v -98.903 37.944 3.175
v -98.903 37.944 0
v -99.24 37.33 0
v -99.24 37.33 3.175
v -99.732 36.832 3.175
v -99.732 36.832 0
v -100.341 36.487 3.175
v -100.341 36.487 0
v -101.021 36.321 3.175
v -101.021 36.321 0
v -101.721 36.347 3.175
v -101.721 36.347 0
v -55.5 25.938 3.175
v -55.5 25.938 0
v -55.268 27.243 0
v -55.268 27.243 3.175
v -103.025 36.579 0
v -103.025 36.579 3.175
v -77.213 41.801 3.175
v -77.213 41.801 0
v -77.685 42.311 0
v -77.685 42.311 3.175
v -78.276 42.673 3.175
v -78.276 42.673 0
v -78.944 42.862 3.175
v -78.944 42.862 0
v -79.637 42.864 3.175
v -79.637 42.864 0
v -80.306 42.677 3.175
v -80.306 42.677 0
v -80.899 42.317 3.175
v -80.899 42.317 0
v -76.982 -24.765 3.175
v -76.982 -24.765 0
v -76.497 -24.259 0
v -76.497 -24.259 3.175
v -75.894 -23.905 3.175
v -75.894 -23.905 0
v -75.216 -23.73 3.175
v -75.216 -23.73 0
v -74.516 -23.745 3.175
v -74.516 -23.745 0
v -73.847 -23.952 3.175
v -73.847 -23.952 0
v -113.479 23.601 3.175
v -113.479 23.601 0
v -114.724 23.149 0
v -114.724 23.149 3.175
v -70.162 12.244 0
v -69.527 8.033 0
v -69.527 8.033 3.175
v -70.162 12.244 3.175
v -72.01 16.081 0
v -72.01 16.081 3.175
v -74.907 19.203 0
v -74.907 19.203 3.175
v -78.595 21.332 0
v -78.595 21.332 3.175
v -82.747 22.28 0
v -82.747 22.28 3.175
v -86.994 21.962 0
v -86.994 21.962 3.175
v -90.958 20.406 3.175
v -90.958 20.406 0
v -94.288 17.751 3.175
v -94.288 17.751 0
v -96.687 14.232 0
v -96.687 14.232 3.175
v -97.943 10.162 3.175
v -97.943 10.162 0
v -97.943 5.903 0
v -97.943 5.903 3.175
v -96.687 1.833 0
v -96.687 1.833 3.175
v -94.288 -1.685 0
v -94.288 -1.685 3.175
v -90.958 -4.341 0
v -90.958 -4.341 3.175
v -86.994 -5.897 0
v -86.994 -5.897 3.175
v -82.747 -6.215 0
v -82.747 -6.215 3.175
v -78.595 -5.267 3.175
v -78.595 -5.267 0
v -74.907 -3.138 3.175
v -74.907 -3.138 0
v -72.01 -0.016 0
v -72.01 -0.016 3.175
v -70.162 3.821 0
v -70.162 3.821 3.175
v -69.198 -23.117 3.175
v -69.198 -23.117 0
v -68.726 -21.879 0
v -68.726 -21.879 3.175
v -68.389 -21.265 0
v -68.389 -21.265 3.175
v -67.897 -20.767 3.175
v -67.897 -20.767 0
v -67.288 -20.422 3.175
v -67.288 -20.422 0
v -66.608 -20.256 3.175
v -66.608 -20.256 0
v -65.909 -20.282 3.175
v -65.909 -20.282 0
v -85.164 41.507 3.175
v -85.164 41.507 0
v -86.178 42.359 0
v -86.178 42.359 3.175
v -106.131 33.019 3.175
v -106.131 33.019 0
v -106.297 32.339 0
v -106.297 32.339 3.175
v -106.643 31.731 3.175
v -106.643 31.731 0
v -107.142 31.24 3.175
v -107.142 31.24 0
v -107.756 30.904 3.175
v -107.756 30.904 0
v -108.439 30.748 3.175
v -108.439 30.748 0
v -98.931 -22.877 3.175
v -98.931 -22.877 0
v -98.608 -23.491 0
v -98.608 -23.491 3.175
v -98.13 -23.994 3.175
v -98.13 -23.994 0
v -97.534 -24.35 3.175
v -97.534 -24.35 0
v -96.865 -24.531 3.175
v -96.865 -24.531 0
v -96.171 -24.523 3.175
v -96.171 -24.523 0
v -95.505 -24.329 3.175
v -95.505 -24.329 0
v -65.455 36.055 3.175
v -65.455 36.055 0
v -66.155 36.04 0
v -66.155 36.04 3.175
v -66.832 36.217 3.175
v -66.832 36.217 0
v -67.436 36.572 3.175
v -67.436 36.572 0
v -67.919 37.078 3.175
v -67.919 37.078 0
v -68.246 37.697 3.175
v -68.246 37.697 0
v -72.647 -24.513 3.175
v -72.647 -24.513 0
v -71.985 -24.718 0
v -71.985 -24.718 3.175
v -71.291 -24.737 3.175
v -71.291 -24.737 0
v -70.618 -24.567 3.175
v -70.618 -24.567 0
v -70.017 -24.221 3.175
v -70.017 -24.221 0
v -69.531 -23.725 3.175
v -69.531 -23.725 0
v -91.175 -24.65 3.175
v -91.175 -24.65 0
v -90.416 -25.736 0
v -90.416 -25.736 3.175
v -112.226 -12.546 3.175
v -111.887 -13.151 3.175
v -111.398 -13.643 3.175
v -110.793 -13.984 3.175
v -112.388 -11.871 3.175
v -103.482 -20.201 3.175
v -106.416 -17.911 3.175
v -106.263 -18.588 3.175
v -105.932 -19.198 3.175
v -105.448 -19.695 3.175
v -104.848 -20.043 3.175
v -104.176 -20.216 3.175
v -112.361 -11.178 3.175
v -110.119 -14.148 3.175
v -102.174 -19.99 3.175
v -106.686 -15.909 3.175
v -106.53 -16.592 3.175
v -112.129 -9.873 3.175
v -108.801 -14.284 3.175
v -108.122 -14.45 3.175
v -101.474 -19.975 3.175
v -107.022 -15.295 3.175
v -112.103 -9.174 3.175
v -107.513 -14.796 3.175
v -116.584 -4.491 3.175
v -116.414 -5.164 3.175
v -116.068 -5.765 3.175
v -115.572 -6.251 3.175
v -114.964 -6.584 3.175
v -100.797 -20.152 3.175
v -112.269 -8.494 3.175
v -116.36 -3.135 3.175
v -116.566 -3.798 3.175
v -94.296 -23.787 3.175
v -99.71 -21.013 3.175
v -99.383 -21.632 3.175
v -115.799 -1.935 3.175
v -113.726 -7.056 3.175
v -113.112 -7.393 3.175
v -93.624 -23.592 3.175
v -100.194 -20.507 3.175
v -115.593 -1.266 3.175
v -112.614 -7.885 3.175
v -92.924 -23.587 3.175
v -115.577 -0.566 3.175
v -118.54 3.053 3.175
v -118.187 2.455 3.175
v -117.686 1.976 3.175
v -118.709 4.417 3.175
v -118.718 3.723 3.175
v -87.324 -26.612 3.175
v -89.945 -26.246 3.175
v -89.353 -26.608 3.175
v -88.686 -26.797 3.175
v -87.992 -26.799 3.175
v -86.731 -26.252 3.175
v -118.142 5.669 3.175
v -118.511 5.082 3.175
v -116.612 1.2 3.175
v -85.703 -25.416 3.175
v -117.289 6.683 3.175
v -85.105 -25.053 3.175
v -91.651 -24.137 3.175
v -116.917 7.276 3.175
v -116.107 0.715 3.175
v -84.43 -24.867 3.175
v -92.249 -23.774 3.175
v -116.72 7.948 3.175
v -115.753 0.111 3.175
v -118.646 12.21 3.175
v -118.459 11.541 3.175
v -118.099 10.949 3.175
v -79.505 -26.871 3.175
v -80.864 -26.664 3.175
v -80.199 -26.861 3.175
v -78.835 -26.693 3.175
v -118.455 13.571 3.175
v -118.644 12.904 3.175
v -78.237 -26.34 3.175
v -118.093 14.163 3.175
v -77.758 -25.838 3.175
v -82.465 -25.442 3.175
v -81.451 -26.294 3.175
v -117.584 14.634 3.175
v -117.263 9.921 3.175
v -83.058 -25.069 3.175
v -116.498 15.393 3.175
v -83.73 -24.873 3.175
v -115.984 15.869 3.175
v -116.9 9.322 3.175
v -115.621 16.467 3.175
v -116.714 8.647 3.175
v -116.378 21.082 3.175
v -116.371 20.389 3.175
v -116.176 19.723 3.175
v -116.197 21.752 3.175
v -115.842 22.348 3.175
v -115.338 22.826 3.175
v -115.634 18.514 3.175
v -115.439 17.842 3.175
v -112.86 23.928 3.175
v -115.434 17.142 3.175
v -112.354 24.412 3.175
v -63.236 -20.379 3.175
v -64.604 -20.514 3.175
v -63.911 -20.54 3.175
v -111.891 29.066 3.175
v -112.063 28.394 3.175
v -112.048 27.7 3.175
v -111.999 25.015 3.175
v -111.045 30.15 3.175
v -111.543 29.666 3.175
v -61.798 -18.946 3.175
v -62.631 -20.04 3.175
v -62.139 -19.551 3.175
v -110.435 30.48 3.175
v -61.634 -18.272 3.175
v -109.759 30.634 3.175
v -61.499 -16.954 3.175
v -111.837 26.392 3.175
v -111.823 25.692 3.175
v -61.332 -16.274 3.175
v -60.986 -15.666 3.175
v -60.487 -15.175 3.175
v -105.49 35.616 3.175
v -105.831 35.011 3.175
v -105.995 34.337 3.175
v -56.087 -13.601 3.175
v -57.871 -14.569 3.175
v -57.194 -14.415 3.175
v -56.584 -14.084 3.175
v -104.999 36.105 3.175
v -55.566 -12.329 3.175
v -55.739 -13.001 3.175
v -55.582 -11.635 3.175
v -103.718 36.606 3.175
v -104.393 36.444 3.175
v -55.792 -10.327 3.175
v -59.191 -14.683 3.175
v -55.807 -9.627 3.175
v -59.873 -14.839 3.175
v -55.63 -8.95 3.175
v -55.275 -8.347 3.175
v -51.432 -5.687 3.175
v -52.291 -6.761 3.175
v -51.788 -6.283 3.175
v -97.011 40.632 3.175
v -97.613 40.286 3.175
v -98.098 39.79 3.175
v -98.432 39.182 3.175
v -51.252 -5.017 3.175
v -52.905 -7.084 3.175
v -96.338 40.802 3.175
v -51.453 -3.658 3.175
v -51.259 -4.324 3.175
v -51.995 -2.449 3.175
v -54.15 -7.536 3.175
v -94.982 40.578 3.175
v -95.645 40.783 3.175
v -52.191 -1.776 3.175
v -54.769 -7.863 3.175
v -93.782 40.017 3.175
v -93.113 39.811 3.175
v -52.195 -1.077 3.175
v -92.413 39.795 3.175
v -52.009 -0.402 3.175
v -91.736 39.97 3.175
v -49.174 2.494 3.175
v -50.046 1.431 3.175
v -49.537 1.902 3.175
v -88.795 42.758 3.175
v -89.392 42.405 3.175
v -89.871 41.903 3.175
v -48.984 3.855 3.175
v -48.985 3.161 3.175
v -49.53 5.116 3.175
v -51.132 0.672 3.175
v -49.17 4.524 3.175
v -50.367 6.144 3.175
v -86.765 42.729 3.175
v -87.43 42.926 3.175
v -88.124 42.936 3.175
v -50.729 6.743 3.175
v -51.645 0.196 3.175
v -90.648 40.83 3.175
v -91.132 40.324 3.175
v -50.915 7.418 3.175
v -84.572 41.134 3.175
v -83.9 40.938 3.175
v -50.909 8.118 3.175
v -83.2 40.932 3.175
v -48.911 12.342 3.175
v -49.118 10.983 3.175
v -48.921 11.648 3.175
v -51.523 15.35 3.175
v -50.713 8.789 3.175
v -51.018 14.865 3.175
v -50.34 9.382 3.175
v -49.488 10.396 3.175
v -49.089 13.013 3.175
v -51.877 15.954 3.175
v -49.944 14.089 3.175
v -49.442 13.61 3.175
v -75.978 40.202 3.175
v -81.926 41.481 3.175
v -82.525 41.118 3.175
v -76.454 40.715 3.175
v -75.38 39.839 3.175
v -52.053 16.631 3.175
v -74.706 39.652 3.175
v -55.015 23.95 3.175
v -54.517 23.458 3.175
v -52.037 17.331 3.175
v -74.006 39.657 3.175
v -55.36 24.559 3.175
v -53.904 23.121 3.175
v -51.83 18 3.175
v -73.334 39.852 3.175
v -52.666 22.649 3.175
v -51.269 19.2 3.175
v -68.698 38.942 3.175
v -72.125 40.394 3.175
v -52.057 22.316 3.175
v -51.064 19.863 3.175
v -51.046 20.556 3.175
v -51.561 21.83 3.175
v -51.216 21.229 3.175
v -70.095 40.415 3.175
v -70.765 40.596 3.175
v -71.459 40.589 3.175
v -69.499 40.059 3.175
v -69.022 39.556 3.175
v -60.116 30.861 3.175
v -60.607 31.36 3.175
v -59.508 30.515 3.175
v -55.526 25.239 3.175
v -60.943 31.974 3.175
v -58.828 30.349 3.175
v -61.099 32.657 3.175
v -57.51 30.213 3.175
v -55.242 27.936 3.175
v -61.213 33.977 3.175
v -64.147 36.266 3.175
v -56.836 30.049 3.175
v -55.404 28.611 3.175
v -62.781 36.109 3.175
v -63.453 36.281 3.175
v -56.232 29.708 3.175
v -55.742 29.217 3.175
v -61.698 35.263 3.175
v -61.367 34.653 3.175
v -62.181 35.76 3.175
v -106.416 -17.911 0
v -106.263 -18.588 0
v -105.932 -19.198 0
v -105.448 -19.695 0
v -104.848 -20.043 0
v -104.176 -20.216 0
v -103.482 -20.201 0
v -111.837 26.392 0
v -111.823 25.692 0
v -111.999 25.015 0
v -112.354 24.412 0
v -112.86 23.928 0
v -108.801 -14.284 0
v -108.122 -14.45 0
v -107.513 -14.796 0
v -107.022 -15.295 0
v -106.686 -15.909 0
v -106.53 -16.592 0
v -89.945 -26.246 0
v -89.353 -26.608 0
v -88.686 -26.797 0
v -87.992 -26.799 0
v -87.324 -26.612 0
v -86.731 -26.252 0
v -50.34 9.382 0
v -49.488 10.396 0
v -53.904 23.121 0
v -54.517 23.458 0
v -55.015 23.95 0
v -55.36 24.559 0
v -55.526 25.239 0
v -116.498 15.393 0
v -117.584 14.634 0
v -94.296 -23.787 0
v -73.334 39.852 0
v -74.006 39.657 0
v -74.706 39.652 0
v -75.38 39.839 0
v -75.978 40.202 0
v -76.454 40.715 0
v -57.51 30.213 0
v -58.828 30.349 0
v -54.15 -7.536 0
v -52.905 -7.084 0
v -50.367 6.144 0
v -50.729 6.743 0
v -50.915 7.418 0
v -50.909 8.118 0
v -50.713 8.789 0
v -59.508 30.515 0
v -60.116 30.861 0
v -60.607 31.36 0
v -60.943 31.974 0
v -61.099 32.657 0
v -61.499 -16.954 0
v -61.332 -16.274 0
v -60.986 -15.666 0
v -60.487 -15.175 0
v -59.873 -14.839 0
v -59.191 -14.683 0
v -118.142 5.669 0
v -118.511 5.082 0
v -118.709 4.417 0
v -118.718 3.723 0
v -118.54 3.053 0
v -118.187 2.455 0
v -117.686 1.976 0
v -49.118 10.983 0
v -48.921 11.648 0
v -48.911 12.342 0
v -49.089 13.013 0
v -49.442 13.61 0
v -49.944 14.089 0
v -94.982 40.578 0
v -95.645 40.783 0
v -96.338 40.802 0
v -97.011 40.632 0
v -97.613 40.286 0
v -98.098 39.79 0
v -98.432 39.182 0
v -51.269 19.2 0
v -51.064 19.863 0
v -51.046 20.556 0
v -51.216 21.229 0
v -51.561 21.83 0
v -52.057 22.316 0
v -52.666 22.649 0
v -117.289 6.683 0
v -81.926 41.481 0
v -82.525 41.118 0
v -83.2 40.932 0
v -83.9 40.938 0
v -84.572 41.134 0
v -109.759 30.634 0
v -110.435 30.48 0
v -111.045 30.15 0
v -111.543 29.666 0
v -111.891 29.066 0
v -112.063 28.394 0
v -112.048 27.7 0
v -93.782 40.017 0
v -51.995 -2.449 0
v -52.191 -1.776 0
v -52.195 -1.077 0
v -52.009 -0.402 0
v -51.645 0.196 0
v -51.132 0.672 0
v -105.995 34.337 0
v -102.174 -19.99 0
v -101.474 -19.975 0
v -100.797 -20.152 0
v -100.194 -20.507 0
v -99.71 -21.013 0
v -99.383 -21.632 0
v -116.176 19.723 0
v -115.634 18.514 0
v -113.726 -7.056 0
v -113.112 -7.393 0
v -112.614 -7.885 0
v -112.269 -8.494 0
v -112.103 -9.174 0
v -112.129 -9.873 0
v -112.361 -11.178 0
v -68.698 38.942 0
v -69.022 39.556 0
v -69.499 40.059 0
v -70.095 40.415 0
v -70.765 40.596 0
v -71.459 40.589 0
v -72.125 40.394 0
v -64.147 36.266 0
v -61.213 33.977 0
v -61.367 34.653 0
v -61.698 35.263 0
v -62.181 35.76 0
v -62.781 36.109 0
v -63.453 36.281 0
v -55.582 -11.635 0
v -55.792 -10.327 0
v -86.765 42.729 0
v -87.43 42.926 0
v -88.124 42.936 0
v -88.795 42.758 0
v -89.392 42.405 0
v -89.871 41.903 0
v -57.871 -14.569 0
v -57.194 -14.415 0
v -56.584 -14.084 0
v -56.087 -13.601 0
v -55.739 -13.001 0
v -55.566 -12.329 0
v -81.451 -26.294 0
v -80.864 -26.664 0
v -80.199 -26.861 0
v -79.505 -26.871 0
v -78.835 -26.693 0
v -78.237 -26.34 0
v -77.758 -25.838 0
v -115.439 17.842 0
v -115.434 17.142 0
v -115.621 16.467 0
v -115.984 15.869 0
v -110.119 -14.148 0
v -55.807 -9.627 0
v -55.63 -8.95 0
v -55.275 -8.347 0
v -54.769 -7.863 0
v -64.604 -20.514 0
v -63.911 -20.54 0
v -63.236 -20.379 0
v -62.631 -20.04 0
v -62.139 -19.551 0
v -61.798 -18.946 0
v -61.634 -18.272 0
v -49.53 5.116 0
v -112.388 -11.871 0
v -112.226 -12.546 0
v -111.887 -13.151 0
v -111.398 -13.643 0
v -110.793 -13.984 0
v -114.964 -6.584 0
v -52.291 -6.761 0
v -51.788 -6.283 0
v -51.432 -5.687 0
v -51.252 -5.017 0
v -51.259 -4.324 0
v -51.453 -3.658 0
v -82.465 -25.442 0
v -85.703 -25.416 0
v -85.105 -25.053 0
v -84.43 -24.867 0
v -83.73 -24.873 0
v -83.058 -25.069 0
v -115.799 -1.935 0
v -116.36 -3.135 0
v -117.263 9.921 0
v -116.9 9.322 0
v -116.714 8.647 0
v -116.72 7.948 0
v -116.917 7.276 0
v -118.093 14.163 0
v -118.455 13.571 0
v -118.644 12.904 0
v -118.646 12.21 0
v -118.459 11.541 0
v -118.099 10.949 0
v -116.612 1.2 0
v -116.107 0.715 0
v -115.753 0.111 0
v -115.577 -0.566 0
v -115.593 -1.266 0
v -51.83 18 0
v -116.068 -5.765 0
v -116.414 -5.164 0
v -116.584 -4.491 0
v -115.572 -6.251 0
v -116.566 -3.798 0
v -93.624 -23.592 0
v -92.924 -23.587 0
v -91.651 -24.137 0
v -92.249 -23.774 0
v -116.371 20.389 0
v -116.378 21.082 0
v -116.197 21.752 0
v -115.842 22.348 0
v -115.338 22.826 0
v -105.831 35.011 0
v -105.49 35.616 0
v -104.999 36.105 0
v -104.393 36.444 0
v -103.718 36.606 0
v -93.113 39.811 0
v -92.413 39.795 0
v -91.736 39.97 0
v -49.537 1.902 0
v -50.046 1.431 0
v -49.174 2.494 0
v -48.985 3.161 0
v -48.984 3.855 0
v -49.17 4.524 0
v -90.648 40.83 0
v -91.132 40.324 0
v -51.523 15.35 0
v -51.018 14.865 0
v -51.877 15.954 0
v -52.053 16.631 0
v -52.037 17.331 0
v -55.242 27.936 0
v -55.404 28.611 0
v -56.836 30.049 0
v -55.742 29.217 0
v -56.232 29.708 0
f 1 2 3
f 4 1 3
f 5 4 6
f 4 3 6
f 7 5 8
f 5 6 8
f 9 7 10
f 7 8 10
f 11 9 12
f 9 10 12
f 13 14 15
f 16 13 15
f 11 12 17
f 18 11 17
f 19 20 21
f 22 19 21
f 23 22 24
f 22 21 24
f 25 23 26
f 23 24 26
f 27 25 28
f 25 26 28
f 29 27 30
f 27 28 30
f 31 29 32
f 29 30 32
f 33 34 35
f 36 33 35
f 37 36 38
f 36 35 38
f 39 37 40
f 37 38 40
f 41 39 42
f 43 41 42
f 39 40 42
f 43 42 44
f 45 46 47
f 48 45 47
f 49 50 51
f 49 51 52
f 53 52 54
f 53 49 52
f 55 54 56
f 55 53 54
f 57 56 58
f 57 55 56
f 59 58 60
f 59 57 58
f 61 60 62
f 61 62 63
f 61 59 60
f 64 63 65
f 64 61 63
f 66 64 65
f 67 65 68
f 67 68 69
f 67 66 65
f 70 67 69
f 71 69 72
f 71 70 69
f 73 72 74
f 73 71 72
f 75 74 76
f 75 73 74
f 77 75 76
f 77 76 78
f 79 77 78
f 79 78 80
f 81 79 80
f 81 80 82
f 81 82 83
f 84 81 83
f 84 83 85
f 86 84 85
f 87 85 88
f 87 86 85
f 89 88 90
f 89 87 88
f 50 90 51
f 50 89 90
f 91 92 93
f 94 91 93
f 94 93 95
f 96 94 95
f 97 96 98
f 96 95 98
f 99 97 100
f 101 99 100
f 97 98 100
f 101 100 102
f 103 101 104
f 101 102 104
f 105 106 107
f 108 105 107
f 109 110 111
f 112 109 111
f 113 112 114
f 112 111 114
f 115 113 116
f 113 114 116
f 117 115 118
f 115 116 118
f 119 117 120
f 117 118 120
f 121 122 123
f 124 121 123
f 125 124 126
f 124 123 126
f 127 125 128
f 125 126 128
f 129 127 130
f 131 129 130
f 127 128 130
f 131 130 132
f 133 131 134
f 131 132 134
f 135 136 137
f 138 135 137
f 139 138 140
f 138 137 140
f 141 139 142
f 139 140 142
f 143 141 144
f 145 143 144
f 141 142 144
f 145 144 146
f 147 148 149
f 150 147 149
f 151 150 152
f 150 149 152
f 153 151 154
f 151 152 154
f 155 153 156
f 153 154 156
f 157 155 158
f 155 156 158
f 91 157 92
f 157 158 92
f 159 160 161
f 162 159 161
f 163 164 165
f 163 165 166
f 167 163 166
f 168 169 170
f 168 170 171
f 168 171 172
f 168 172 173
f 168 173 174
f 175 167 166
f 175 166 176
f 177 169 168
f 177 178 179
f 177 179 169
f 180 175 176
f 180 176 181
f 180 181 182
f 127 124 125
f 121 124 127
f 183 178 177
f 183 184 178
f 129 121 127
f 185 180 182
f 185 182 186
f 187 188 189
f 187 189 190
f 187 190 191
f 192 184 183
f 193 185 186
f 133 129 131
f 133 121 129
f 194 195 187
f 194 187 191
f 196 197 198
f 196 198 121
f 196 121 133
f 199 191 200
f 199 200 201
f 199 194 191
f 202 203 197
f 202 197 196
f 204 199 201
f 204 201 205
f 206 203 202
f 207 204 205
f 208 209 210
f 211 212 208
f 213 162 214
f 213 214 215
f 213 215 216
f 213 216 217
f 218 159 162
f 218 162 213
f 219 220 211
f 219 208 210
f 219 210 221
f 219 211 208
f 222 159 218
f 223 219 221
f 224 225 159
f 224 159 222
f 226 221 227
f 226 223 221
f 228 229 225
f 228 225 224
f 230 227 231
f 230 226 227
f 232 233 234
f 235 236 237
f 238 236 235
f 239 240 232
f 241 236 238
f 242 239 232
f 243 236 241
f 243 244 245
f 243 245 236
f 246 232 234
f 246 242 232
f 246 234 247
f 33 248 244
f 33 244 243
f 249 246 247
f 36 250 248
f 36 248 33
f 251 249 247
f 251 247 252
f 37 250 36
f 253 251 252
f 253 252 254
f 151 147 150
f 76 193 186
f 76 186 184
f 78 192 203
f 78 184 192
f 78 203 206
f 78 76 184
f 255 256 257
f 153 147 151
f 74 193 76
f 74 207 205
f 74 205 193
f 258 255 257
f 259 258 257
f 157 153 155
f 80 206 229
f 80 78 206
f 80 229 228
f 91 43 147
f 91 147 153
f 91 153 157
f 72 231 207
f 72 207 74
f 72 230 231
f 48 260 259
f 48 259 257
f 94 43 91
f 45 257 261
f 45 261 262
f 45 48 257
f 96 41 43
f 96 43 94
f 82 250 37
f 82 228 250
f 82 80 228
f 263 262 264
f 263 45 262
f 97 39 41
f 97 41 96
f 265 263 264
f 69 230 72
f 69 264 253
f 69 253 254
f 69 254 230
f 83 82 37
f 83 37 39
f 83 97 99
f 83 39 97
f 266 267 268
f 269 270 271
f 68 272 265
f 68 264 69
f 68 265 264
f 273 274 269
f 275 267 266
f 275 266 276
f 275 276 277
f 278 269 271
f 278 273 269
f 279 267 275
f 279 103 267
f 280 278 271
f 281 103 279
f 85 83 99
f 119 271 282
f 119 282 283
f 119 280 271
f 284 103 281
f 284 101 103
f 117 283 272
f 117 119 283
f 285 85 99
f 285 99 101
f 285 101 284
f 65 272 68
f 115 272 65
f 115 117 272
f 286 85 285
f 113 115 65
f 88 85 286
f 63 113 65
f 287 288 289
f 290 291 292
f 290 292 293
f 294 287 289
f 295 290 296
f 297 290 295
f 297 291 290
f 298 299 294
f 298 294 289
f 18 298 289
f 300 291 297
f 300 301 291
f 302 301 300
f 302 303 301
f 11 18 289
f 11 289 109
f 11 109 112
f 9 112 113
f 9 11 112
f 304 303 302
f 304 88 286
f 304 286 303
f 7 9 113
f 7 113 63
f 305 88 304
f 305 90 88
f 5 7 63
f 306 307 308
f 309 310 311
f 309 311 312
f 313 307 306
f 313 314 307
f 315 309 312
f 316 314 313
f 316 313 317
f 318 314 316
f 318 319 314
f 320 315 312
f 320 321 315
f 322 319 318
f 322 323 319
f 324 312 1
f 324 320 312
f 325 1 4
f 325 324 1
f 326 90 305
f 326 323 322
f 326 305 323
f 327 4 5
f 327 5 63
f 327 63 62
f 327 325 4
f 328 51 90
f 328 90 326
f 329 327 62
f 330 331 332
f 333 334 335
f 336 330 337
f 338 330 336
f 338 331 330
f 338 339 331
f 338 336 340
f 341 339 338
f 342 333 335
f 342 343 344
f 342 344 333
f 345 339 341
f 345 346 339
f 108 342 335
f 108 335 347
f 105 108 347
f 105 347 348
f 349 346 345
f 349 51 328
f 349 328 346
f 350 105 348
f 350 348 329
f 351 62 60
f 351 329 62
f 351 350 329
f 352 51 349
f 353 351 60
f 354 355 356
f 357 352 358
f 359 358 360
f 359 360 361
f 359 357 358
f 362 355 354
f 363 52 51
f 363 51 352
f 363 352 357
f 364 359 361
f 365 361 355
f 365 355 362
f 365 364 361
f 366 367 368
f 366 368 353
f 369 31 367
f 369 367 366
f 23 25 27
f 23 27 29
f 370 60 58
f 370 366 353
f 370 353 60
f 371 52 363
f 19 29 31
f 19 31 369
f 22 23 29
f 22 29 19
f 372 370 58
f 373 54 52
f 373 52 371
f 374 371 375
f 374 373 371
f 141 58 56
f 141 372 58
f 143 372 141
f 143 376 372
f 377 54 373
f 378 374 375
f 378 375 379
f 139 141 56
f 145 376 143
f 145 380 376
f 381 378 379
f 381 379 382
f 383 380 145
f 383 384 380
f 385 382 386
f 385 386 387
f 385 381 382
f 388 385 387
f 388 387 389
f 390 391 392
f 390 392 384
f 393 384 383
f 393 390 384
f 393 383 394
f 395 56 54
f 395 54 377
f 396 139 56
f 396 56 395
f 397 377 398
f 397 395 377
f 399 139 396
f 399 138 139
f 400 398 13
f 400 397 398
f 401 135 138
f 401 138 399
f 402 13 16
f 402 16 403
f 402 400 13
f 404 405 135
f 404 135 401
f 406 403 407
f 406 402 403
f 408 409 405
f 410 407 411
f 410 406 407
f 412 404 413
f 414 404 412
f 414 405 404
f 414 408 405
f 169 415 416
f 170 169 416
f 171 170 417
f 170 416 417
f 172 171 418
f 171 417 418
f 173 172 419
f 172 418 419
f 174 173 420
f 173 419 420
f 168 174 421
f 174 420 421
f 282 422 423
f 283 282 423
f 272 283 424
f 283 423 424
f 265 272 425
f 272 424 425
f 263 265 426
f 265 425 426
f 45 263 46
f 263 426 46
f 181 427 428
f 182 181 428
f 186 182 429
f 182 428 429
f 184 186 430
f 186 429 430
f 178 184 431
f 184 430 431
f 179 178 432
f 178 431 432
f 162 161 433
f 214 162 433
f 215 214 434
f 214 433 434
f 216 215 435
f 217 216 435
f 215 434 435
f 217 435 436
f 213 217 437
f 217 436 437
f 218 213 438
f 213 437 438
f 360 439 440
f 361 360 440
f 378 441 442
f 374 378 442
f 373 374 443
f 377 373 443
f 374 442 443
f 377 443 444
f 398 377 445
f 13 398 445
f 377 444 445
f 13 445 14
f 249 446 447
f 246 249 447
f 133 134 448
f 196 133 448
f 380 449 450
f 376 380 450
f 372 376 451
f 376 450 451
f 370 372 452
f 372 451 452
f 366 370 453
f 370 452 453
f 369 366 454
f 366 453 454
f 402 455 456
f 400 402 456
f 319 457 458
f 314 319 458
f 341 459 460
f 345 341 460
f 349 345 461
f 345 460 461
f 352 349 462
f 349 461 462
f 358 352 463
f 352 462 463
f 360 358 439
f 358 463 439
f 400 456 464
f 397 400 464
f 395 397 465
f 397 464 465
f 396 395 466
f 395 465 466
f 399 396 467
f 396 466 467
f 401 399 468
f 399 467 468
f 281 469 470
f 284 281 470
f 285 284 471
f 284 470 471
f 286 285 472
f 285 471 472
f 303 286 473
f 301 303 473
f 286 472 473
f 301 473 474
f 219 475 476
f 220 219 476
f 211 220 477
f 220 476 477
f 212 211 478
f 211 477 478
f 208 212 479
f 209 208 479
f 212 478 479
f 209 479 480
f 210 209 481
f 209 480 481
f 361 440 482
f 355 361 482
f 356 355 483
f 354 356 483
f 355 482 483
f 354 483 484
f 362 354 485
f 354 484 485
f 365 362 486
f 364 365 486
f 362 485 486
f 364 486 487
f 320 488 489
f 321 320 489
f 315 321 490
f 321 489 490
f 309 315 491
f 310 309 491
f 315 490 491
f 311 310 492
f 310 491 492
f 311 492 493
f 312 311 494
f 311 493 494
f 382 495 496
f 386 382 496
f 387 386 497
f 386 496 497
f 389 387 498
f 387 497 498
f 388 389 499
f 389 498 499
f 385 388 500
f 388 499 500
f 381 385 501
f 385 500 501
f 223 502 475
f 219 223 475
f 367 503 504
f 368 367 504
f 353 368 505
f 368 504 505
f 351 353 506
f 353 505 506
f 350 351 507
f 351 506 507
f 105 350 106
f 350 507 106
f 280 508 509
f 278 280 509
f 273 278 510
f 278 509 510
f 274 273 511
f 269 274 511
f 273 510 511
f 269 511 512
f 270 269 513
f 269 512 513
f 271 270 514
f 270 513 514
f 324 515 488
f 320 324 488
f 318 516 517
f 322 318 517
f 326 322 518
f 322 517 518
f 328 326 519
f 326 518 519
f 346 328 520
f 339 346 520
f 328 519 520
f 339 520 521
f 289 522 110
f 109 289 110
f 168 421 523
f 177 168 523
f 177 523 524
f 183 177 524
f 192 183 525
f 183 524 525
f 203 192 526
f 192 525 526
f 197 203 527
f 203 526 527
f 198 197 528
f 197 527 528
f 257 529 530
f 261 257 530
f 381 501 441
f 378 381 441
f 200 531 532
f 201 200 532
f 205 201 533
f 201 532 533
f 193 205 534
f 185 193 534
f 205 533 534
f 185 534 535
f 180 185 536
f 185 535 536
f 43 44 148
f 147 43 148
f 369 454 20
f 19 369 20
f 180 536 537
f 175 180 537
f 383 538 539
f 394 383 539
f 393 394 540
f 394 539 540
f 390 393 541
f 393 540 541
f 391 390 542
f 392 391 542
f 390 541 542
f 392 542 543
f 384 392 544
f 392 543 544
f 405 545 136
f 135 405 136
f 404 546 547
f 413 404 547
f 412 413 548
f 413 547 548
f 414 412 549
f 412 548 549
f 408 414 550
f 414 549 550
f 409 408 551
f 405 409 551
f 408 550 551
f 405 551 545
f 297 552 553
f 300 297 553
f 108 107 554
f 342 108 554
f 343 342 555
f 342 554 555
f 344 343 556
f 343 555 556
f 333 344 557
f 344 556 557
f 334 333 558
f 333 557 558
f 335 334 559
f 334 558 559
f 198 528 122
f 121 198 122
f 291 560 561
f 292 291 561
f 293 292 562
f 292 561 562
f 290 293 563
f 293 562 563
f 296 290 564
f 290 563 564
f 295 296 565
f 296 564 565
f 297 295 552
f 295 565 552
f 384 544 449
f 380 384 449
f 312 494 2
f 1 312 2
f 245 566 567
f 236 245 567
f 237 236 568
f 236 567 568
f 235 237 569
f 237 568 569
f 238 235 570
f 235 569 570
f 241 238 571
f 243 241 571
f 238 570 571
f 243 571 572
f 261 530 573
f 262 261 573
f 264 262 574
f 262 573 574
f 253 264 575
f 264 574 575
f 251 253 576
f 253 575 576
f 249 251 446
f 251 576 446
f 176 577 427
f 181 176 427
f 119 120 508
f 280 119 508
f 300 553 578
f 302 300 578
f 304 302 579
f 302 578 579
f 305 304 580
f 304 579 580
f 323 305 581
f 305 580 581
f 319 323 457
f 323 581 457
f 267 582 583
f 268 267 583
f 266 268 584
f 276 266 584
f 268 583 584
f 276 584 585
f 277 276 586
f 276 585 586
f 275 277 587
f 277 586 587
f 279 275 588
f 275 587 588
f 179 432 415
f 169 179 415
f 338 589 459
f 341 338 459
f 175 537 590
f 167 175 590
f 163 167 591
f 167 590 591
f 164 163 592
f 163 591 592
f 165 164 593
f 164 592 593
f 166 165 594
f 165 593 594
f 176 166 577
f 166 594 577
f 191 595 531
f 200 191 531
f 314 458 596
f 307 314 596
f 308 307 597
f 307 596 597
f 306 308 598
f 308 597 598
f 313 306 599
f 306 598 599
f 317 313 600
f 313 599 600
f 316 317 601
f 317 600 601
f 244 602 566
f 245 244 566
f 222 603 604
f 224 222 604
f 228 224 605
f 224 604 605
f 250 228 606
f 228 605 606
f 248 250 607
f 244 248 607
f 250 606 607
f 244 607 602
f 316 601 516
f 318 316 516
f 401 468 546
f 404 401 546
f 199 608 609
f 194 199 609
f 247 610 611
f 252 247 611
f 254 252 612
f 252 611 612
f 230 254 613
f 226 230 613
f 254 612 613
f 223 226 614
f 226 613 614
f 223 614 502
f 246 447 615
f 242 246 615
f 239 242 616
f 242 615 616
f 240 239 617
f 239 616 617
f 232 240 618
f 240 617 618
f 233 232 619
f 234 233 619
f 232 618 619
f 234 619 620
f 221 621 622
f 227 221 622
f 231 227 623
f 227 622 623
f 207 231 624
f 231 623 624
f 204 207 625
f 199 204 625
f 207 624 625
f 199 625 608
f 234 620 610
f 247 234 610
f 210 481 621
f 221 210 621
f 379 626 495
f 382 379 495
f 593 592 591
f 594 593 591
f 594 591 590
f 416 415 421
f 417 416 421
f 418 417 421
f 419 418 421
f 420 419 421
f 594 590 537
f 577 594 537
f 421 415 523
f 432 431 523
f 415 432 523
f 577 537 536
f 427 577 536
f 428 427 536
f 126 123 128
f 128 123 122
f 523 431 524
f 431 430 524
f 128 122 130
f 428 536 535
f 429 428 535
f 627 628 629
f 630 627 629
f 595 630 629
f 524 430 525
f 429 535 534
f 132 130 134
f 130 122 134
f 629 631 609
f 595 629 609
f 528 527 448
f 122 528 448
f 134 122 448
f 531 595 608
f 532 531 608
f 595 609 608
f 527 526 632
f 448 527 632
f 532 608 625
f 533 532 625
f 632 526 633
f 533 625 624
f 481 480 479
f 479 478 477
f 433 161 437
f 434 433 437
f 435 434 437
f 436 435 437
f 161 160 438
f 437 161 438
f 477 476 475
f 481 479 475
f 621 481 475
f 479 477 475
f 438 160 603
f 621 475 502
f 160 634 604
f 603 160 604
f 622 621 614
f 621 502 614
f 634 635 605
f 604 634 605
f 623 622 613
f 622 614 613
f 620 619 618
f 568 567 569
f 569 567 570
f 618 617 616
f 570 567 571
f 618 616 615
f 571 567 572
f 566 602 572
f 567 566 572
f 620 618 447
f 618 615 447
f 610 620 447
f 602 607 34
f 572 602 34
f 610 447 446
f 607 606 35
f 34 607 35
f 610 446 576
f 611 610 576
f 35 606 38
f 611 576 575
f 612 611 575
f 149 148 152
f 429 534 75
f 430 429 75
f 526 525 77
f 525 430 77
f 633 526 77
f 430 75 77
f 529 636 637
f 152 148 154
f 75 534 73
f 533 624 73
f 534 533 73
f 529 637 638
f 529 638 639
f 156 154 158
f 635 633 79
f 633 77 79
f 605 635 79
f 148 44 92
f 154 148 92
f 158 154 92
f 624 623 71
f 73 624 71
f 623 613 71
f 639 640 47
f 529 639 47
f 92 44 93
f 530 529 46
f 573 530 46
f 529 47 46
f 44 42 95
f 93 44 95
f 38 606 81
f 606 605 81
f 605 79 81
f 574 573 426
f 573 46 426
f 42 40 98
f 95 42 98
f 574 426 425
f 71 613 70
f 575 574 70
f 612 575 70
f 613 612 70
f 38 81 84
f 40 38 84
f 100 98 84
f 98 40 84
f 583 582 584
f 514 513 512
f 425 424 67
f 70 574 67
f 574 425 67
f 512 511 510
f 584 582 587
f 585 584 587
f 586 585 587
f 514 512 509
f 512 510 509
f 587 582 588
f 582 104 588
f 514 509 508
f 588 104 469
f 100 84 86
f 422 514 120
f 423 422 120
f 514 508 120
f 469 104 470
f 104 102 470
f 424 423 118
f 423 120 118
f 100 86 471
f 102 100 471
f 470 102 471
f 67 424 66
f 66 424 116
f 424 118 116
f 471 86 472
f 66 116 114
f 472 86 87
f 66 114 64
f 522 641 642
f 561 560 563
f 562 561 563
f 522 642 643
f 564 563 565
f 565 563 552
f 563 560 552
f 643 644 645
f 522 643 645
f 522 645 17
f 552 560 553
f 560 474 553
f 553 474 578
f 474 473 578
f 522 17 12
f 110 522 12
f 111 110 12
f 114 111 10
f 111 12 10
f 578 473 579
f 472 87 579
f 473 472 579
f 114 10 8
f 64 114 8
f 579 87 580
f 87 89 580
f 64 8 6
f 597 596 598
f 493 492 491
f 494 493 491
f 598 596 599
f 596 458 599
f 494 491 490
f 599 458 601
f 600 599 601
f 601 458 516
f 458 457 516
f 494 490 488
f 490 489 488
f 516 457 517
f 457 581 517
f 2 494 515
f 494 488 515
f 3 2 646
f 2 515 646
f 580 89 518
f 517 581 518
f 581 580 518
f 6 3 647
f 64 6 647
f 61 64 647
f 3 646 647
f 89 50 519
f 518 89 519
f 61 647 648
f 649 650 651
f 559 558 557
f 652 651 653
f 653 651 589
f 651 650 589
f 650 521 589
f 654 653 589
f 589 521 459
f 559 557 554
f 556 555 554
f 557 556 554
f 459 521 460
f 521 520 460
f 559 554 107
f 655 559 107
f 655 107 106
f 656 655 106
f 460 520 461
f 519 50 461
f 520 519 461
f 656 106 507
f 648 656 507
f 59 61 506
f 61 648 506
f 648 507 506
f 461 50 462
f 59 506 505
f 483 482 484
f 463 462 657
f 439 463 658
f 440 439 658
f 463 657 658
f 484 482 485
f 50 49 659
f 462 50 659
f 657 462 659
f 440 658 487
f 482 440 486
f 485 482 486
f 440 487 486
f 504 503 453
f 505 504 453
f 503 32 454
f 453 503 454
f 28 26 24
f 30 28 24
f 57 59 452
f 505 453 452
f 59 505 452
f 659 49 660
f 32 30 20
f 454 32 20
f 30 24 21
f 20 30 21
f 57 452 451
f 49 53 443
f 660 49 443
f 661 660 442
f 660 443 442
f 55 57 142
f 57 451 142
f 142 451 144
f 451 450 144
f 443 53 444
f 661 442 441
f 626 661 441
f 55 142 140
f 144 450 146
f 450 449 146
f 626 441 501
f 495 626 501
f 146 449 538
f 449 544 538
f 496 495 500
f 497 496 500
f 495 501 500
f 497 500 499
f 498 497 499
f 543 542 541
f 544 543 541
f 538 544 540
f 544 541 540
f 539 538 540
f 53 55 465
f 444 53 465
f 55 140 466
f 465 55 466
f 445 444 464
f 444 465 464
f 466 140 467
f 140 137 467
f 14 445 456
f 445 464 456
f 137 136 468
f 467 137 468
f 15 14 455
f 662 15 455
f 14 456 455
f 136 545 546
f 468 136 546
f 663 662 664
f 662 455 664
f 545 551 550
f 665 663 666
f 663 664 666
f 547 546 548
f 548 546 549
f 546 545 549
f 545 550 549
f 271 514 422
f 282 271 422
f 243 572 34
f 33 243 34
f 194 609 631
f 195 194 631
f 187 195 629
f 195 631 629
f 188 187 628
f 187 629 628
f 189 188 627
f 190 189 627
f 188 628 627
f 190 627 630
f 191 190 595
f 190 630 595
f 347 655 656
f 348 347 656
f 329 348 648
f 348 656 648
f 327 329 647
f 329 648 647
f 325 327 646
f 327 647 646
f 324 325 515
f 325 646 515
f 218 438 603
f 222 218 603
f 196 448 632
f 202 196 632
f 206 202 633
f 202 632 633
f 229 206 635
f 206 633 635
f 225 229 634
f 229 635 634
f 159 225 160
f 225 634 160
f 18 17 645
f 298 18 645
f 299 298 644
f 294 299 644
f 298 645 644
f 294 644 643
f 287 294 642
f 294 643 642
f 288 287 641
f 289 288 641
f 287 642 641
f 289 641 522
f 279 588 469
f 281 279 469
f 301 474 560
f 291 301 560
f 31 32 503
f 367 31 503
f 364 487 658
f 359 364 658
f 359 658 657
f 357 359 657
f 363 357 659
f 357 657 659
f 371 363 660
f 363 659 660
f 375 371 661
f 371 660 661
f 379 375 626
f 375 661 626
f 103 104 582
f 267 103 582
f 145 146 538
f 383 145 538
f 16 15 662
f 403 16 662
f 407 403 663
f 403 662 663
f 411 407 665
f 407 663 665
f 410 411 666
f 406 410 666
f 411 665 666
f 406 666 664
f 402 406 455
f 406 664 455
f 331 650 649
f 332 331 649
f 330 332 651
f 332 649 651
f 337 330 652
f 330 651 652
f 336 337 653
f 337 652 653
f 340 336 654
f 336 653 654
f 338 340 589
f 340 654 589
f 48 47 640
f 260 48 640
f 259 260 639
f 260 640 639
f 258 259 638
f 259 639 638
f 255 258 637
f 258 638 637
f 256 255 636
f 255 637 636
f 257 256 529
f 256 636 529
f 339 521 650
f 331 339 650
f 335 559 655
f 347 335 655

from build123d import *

# Parameters (mm, degrees)
F0_R     = 14.2875
F1_DEPTH = 3.175


with BuildPart() as f1:
    # F0 (on Top) → F1 (new body)
    with BuildSketch(Plane.XY):
        with BuildLine():
            Line((-101.720522, 36.347288), (-103.024984, 36.578738))
            ThreePointArc((-103.024984, 36.578738), (-104.9987, 36.105304), (-105.995444, 34.337198))
            Line((-105.995444, 34.337198), (-106.130744, 33.019289))
            ThreePointArc((-106.130744, 33.019289), (-106.875934, 31.46823), (-108.438793, 30.748117))
            Line((-108.438793, 30.748117), (-109.758711, 30.634062))
            ThreePointArc((-109.758711, 30.634062), (-111.542641, 29.665924), (-112.047802, 27.700088))
            Line((-112.047802, 27.700088), (-111.837391, 26.392068))
            ThreePointArc((-111.837391, 26.392068), (-112.155746, 24.700991), (-113.478973, 23.600917))
            Line((-113.478973, 23.600917), (-114.724396, 23.149128))
            ThreePointArc((-114.724396, 23.149128), (-116.196967, 21.752264), (-116.17612, 19.722667))
            Line((-116.17612, 19.722667), (-115.634338, 18.513674))
            ThreePointArc((-115.634338, 18.513674), (-115.504162, 16.797823), (-116.497582, 15.392757))
            Line((-116.497582, 15.392757), (-117.583636, 14.634023))
            ThreePointArc((-117.583636, 14.634023), (-118.644496, 12.903626), (-118.09906, 10.948582))
            Line((-118.09906, 10.948582), (-117.262829, 9.921009))
            ThreePointArc((-117.262829, 9.921009), (-116.692994, 8.297315), (-117.288906, 6.68301))
            Line((-117.288906, 6.68301), (-118.141578, 5.669038))
            ThreePointArc((-118.141578, 5.669038), (-118.718431, 3.723032), (-117.685578, 1.975774))
            Line((-117.685578, 1.975774), (-116.611885, 1.199647))
            ThreePointArc((-116.611885, 1.199647), (-115.641224, -0.221237), (-115.799017, -1.934769))
            Line((-115.799017, -1.934769), (-116.360201, -3.134879))
            ThreePointArc((-116.360201, -3.134879), (-116.413734, -5.163876), (-114.963851, -6.584277))
            Line((-114.963851, -6.584277), (-113.725866, -7.056066))
            ThreePointArc((-113.725866, -7.056066), (-112.420528, -8.177308), (-112.12945, -9.873293))
            Line((-112.12945, -9.873293), (-112.360901, -11.177755))
            ThreePointArc((-112.360901, -11.177755), (-111.887466, -13.151472), (-110.11936, -14.148215))
            Line((-110.11936, -14.148215), (-108.801451, -14.283515))
            ThreePointArc((-108.801451, -14.283515), (-107.250392, -15.028705), (-106.53028, -16.591565))
            Line((-106.53028, -16.591565), (-106.416224, -17.911482))
            ThreePointArc((-106.416224, -17.911482), (-105.448086, -19.695412), (-103.48225, -20.200573))
            Line((-103.48225, -20.200573), (-102.17423, -19.990162))
            ThreePointArc((-102.17423, -19.990162), (-100.483153, -20.308517), (-99.383079, -21.631745))
            Line((-99.383079, -21.631745), (-98.93129, -22.877167))
            ThreePointArc((-98.93129, -22.877167), (-97.534426, -24.349739), (-95.504829, -24.328891))
            Line((-95.504829, -24.328891), (-94.295837, -23.787109))
            ThreePointArc((-94.295837, -23.787109), (-92.579985, -23.656934), (-91.174919, -24.650353))
            Line((-91.174919, -24.650353), (-90.416186, -25.736407))
            ThreePointArc((-90.416186, -25.736407), (-88.685789, -26.797267), (-86.730744, -26.251831))
            Line((-86.730744, -26.251831), (-85.703171, -25.4156))
            ThreePointArc((-85.703171, -25.4156), (-84.079478, -24.845765), (-82.465172, -25.441677))
            Line((-82.465172, -25.441677), (-81.4512, -26.29435))
            ThreePointArc((-81.4512, -26.29435), (-79.505194, -26.871202), (-77.757936, -25.838349))
            Line((-77.757936, -25.838349), (-76.981809, -24.764656))
            ThreePointArc((-76.981809, -24.764656), (-75.560925, -23.793995), (-73.847393, -23.951788))
            Line((-73.847393, -23.951788), (-72.647283, -24.512972))
            ThreePointArc((-72.647283, -24.512972), (-70.618286, -24.566505), (-69.197886, -23.116622))
            Line((-69.197886, -23.116622), (-68.726097, -21.878637))
            ThreePointArc((-68.726097, -21.878637), (-67.604854, -20.573299), (-65.908869, -20.282221))
            Line((-65.908869, -20.282221), (-64.604407, -20.513672))
            ThreePointArc((-64.604407, -20.513672), (-62.630691, -20.040237), (-61.633947, -18.272131))
            Line((-61.633947, -18.272131), (-61.498647, -16.954222))
            ThreePointArc((-61.498647, -16.954222), (-60.753457, -15.403164), (-59.190598, -14.683051))
            Line((-59.190598, -14.683051), (-57.87068, -14.568995))
            ThreePointArc((-57.87068, -14.568995), (-56.08675, -13.600857), (-55.581589, -11.635021))
            Line((-55.581589, -11.635021), (-55.792, -10.327001))
            ThreePointArc((-55.792, -10.327001), (-55.473645, -8.635924), (-54.150418, -7.53585))
            Line((-54.150418, -7.53585), (-52.904995, -7.084061))
            ThreePointArc((-52.904995, -7.084061), (-51.432424, -5.687197), (-51.453271, -3.6576))
            Line((-51.453271, -3.6576), (-51.995053, -2.448608))
            ThreePointArc((-51.995053, -2.448608), (-52.125228, -0.732756), (-51.131809, 0.672309))
            Line((-51.131809, 0.672309), (-50.045755, 1.431043))
            ThreePointArc((-50.045755, 1.431043), (-48.984895, 3.16144), (-49.530331, 5.116484))
            Line((-49.530331, 5.116484), (-50.366562, 6.144058))
            ThreePointArc((-50.366562, 6.144058), (-50.936397, 7.767751), (-50.340485, 9.382056))
            Line((-50.340485, 9.382056), (-49.487813, 10.396028))
            ThreePointArc((-49.487813, 10.396028), (-48.91096, 12.342034), (-49.943813, 14.089293))
            Line((-49.943813, 14.089293), (-51.017506, 14.86542))
            ThreePointArc((-51.017506, 14.86542), (-51.988167, 16.286303), (-51.830374, 17.999836))
            Line((-51.830374, 17.999836), (-51.26919, 19.199945))
            ThreePointArc((-51.26919, 19.199945), (-51.215657, 21.228943), (-52.66554, 22.649343))
            Line((-52.66554, 22.649343), (-53.903525, 23.121132))
            ThreePointArc((-53.903525, 23.121132), (-55.208863, 24.242375), (-55.499941, 25.93836))
            Line((-55.499941, 25.93836), (-55.26849, 27.242822))
            ThreePointArc((-55.26849, 27.242822), (-55.741925, 29.216538), (-57.510031, 30.213282))
            Line((-57.510031, 30.213282), (-58.82794, 30.348581))
            ThreePointArc((-58.82794, 30.348581), (-60.378998, 31.093772), (-61.099111, 32.656631))
            Line((-61.099111, 32.656631), (-61.213167, 33.976548))
            ThreePointArc((-61.213167, 33.976548), (-62.181305, 35.760479), (-64.147141, 36.26564))
            Line((-64.147141, 36.26564), (-65.455161, 36.055229))
            ThreePointArc((-65.455161, 36.055229), (-67.146238, 36.373584), (-68.246312, 37.696811))
            Line((-68.246312, 37.696811), (-68.698101, 38.942234))
            ThreePointArc((-68.698101, 38.942234), (-70.094965, 40.414805), (-72.124562, 40.393958))
            Line((-72.124562, 40.393958), (-73.333554, 39.852176))
            ThreePointArc((-73.333554, 39.852176), (-75.049406, 39.722), (-76.454472, 40.71542))
            Line((-76.454472, 40.71542), (-77.213205, 41.801474))
            ThreePointArc((-77.213205, 41.801474), (-78.943602, 42.862333), (-80.898647, 42.316898))
            Line((-80.898647, 42.316898), (-81.92622, 41.480667))
            ThreePointArc((-81.92622, 41.480667), (-83.549913, 40.910832), (-85.164219, 41.506743))
            Line((-85.164219, 41.506743), (-86.178191, 42.359416))
            ThreePointArc((-86.178191, 42.359416), (-88.124197, 42.936268), (-89.871455, 41.903416))
            Line((-89.871455, 41.903416), (-90.647582, 40.829723))
            ThreePointArc((-90.647582, 40.829723), (-92.068465, 39.859062), (-93.781998, 40.016855))
            Line((-93.781998, 40.016855), (-94.982107, 40.578039))
            ThreePointArc((-94.982107, 40.578039), (-97.011105, 40.631572), (-98.431505, 39.181689))
            Line((-98.431505, 39.181689), (-98.903294, 37.943704))
            ThreePointArc((-98.903294, 37.943704), (-100.024537, 36.638366), (-101.720522, 36.347288))
        make_face()
        with Locations((-83.814695, 8.032533)):
            Circle(F0_R, mode=Mode.SUBTRACT)
    extrude(amount=F1_DEPTH)


solid = f1.part
